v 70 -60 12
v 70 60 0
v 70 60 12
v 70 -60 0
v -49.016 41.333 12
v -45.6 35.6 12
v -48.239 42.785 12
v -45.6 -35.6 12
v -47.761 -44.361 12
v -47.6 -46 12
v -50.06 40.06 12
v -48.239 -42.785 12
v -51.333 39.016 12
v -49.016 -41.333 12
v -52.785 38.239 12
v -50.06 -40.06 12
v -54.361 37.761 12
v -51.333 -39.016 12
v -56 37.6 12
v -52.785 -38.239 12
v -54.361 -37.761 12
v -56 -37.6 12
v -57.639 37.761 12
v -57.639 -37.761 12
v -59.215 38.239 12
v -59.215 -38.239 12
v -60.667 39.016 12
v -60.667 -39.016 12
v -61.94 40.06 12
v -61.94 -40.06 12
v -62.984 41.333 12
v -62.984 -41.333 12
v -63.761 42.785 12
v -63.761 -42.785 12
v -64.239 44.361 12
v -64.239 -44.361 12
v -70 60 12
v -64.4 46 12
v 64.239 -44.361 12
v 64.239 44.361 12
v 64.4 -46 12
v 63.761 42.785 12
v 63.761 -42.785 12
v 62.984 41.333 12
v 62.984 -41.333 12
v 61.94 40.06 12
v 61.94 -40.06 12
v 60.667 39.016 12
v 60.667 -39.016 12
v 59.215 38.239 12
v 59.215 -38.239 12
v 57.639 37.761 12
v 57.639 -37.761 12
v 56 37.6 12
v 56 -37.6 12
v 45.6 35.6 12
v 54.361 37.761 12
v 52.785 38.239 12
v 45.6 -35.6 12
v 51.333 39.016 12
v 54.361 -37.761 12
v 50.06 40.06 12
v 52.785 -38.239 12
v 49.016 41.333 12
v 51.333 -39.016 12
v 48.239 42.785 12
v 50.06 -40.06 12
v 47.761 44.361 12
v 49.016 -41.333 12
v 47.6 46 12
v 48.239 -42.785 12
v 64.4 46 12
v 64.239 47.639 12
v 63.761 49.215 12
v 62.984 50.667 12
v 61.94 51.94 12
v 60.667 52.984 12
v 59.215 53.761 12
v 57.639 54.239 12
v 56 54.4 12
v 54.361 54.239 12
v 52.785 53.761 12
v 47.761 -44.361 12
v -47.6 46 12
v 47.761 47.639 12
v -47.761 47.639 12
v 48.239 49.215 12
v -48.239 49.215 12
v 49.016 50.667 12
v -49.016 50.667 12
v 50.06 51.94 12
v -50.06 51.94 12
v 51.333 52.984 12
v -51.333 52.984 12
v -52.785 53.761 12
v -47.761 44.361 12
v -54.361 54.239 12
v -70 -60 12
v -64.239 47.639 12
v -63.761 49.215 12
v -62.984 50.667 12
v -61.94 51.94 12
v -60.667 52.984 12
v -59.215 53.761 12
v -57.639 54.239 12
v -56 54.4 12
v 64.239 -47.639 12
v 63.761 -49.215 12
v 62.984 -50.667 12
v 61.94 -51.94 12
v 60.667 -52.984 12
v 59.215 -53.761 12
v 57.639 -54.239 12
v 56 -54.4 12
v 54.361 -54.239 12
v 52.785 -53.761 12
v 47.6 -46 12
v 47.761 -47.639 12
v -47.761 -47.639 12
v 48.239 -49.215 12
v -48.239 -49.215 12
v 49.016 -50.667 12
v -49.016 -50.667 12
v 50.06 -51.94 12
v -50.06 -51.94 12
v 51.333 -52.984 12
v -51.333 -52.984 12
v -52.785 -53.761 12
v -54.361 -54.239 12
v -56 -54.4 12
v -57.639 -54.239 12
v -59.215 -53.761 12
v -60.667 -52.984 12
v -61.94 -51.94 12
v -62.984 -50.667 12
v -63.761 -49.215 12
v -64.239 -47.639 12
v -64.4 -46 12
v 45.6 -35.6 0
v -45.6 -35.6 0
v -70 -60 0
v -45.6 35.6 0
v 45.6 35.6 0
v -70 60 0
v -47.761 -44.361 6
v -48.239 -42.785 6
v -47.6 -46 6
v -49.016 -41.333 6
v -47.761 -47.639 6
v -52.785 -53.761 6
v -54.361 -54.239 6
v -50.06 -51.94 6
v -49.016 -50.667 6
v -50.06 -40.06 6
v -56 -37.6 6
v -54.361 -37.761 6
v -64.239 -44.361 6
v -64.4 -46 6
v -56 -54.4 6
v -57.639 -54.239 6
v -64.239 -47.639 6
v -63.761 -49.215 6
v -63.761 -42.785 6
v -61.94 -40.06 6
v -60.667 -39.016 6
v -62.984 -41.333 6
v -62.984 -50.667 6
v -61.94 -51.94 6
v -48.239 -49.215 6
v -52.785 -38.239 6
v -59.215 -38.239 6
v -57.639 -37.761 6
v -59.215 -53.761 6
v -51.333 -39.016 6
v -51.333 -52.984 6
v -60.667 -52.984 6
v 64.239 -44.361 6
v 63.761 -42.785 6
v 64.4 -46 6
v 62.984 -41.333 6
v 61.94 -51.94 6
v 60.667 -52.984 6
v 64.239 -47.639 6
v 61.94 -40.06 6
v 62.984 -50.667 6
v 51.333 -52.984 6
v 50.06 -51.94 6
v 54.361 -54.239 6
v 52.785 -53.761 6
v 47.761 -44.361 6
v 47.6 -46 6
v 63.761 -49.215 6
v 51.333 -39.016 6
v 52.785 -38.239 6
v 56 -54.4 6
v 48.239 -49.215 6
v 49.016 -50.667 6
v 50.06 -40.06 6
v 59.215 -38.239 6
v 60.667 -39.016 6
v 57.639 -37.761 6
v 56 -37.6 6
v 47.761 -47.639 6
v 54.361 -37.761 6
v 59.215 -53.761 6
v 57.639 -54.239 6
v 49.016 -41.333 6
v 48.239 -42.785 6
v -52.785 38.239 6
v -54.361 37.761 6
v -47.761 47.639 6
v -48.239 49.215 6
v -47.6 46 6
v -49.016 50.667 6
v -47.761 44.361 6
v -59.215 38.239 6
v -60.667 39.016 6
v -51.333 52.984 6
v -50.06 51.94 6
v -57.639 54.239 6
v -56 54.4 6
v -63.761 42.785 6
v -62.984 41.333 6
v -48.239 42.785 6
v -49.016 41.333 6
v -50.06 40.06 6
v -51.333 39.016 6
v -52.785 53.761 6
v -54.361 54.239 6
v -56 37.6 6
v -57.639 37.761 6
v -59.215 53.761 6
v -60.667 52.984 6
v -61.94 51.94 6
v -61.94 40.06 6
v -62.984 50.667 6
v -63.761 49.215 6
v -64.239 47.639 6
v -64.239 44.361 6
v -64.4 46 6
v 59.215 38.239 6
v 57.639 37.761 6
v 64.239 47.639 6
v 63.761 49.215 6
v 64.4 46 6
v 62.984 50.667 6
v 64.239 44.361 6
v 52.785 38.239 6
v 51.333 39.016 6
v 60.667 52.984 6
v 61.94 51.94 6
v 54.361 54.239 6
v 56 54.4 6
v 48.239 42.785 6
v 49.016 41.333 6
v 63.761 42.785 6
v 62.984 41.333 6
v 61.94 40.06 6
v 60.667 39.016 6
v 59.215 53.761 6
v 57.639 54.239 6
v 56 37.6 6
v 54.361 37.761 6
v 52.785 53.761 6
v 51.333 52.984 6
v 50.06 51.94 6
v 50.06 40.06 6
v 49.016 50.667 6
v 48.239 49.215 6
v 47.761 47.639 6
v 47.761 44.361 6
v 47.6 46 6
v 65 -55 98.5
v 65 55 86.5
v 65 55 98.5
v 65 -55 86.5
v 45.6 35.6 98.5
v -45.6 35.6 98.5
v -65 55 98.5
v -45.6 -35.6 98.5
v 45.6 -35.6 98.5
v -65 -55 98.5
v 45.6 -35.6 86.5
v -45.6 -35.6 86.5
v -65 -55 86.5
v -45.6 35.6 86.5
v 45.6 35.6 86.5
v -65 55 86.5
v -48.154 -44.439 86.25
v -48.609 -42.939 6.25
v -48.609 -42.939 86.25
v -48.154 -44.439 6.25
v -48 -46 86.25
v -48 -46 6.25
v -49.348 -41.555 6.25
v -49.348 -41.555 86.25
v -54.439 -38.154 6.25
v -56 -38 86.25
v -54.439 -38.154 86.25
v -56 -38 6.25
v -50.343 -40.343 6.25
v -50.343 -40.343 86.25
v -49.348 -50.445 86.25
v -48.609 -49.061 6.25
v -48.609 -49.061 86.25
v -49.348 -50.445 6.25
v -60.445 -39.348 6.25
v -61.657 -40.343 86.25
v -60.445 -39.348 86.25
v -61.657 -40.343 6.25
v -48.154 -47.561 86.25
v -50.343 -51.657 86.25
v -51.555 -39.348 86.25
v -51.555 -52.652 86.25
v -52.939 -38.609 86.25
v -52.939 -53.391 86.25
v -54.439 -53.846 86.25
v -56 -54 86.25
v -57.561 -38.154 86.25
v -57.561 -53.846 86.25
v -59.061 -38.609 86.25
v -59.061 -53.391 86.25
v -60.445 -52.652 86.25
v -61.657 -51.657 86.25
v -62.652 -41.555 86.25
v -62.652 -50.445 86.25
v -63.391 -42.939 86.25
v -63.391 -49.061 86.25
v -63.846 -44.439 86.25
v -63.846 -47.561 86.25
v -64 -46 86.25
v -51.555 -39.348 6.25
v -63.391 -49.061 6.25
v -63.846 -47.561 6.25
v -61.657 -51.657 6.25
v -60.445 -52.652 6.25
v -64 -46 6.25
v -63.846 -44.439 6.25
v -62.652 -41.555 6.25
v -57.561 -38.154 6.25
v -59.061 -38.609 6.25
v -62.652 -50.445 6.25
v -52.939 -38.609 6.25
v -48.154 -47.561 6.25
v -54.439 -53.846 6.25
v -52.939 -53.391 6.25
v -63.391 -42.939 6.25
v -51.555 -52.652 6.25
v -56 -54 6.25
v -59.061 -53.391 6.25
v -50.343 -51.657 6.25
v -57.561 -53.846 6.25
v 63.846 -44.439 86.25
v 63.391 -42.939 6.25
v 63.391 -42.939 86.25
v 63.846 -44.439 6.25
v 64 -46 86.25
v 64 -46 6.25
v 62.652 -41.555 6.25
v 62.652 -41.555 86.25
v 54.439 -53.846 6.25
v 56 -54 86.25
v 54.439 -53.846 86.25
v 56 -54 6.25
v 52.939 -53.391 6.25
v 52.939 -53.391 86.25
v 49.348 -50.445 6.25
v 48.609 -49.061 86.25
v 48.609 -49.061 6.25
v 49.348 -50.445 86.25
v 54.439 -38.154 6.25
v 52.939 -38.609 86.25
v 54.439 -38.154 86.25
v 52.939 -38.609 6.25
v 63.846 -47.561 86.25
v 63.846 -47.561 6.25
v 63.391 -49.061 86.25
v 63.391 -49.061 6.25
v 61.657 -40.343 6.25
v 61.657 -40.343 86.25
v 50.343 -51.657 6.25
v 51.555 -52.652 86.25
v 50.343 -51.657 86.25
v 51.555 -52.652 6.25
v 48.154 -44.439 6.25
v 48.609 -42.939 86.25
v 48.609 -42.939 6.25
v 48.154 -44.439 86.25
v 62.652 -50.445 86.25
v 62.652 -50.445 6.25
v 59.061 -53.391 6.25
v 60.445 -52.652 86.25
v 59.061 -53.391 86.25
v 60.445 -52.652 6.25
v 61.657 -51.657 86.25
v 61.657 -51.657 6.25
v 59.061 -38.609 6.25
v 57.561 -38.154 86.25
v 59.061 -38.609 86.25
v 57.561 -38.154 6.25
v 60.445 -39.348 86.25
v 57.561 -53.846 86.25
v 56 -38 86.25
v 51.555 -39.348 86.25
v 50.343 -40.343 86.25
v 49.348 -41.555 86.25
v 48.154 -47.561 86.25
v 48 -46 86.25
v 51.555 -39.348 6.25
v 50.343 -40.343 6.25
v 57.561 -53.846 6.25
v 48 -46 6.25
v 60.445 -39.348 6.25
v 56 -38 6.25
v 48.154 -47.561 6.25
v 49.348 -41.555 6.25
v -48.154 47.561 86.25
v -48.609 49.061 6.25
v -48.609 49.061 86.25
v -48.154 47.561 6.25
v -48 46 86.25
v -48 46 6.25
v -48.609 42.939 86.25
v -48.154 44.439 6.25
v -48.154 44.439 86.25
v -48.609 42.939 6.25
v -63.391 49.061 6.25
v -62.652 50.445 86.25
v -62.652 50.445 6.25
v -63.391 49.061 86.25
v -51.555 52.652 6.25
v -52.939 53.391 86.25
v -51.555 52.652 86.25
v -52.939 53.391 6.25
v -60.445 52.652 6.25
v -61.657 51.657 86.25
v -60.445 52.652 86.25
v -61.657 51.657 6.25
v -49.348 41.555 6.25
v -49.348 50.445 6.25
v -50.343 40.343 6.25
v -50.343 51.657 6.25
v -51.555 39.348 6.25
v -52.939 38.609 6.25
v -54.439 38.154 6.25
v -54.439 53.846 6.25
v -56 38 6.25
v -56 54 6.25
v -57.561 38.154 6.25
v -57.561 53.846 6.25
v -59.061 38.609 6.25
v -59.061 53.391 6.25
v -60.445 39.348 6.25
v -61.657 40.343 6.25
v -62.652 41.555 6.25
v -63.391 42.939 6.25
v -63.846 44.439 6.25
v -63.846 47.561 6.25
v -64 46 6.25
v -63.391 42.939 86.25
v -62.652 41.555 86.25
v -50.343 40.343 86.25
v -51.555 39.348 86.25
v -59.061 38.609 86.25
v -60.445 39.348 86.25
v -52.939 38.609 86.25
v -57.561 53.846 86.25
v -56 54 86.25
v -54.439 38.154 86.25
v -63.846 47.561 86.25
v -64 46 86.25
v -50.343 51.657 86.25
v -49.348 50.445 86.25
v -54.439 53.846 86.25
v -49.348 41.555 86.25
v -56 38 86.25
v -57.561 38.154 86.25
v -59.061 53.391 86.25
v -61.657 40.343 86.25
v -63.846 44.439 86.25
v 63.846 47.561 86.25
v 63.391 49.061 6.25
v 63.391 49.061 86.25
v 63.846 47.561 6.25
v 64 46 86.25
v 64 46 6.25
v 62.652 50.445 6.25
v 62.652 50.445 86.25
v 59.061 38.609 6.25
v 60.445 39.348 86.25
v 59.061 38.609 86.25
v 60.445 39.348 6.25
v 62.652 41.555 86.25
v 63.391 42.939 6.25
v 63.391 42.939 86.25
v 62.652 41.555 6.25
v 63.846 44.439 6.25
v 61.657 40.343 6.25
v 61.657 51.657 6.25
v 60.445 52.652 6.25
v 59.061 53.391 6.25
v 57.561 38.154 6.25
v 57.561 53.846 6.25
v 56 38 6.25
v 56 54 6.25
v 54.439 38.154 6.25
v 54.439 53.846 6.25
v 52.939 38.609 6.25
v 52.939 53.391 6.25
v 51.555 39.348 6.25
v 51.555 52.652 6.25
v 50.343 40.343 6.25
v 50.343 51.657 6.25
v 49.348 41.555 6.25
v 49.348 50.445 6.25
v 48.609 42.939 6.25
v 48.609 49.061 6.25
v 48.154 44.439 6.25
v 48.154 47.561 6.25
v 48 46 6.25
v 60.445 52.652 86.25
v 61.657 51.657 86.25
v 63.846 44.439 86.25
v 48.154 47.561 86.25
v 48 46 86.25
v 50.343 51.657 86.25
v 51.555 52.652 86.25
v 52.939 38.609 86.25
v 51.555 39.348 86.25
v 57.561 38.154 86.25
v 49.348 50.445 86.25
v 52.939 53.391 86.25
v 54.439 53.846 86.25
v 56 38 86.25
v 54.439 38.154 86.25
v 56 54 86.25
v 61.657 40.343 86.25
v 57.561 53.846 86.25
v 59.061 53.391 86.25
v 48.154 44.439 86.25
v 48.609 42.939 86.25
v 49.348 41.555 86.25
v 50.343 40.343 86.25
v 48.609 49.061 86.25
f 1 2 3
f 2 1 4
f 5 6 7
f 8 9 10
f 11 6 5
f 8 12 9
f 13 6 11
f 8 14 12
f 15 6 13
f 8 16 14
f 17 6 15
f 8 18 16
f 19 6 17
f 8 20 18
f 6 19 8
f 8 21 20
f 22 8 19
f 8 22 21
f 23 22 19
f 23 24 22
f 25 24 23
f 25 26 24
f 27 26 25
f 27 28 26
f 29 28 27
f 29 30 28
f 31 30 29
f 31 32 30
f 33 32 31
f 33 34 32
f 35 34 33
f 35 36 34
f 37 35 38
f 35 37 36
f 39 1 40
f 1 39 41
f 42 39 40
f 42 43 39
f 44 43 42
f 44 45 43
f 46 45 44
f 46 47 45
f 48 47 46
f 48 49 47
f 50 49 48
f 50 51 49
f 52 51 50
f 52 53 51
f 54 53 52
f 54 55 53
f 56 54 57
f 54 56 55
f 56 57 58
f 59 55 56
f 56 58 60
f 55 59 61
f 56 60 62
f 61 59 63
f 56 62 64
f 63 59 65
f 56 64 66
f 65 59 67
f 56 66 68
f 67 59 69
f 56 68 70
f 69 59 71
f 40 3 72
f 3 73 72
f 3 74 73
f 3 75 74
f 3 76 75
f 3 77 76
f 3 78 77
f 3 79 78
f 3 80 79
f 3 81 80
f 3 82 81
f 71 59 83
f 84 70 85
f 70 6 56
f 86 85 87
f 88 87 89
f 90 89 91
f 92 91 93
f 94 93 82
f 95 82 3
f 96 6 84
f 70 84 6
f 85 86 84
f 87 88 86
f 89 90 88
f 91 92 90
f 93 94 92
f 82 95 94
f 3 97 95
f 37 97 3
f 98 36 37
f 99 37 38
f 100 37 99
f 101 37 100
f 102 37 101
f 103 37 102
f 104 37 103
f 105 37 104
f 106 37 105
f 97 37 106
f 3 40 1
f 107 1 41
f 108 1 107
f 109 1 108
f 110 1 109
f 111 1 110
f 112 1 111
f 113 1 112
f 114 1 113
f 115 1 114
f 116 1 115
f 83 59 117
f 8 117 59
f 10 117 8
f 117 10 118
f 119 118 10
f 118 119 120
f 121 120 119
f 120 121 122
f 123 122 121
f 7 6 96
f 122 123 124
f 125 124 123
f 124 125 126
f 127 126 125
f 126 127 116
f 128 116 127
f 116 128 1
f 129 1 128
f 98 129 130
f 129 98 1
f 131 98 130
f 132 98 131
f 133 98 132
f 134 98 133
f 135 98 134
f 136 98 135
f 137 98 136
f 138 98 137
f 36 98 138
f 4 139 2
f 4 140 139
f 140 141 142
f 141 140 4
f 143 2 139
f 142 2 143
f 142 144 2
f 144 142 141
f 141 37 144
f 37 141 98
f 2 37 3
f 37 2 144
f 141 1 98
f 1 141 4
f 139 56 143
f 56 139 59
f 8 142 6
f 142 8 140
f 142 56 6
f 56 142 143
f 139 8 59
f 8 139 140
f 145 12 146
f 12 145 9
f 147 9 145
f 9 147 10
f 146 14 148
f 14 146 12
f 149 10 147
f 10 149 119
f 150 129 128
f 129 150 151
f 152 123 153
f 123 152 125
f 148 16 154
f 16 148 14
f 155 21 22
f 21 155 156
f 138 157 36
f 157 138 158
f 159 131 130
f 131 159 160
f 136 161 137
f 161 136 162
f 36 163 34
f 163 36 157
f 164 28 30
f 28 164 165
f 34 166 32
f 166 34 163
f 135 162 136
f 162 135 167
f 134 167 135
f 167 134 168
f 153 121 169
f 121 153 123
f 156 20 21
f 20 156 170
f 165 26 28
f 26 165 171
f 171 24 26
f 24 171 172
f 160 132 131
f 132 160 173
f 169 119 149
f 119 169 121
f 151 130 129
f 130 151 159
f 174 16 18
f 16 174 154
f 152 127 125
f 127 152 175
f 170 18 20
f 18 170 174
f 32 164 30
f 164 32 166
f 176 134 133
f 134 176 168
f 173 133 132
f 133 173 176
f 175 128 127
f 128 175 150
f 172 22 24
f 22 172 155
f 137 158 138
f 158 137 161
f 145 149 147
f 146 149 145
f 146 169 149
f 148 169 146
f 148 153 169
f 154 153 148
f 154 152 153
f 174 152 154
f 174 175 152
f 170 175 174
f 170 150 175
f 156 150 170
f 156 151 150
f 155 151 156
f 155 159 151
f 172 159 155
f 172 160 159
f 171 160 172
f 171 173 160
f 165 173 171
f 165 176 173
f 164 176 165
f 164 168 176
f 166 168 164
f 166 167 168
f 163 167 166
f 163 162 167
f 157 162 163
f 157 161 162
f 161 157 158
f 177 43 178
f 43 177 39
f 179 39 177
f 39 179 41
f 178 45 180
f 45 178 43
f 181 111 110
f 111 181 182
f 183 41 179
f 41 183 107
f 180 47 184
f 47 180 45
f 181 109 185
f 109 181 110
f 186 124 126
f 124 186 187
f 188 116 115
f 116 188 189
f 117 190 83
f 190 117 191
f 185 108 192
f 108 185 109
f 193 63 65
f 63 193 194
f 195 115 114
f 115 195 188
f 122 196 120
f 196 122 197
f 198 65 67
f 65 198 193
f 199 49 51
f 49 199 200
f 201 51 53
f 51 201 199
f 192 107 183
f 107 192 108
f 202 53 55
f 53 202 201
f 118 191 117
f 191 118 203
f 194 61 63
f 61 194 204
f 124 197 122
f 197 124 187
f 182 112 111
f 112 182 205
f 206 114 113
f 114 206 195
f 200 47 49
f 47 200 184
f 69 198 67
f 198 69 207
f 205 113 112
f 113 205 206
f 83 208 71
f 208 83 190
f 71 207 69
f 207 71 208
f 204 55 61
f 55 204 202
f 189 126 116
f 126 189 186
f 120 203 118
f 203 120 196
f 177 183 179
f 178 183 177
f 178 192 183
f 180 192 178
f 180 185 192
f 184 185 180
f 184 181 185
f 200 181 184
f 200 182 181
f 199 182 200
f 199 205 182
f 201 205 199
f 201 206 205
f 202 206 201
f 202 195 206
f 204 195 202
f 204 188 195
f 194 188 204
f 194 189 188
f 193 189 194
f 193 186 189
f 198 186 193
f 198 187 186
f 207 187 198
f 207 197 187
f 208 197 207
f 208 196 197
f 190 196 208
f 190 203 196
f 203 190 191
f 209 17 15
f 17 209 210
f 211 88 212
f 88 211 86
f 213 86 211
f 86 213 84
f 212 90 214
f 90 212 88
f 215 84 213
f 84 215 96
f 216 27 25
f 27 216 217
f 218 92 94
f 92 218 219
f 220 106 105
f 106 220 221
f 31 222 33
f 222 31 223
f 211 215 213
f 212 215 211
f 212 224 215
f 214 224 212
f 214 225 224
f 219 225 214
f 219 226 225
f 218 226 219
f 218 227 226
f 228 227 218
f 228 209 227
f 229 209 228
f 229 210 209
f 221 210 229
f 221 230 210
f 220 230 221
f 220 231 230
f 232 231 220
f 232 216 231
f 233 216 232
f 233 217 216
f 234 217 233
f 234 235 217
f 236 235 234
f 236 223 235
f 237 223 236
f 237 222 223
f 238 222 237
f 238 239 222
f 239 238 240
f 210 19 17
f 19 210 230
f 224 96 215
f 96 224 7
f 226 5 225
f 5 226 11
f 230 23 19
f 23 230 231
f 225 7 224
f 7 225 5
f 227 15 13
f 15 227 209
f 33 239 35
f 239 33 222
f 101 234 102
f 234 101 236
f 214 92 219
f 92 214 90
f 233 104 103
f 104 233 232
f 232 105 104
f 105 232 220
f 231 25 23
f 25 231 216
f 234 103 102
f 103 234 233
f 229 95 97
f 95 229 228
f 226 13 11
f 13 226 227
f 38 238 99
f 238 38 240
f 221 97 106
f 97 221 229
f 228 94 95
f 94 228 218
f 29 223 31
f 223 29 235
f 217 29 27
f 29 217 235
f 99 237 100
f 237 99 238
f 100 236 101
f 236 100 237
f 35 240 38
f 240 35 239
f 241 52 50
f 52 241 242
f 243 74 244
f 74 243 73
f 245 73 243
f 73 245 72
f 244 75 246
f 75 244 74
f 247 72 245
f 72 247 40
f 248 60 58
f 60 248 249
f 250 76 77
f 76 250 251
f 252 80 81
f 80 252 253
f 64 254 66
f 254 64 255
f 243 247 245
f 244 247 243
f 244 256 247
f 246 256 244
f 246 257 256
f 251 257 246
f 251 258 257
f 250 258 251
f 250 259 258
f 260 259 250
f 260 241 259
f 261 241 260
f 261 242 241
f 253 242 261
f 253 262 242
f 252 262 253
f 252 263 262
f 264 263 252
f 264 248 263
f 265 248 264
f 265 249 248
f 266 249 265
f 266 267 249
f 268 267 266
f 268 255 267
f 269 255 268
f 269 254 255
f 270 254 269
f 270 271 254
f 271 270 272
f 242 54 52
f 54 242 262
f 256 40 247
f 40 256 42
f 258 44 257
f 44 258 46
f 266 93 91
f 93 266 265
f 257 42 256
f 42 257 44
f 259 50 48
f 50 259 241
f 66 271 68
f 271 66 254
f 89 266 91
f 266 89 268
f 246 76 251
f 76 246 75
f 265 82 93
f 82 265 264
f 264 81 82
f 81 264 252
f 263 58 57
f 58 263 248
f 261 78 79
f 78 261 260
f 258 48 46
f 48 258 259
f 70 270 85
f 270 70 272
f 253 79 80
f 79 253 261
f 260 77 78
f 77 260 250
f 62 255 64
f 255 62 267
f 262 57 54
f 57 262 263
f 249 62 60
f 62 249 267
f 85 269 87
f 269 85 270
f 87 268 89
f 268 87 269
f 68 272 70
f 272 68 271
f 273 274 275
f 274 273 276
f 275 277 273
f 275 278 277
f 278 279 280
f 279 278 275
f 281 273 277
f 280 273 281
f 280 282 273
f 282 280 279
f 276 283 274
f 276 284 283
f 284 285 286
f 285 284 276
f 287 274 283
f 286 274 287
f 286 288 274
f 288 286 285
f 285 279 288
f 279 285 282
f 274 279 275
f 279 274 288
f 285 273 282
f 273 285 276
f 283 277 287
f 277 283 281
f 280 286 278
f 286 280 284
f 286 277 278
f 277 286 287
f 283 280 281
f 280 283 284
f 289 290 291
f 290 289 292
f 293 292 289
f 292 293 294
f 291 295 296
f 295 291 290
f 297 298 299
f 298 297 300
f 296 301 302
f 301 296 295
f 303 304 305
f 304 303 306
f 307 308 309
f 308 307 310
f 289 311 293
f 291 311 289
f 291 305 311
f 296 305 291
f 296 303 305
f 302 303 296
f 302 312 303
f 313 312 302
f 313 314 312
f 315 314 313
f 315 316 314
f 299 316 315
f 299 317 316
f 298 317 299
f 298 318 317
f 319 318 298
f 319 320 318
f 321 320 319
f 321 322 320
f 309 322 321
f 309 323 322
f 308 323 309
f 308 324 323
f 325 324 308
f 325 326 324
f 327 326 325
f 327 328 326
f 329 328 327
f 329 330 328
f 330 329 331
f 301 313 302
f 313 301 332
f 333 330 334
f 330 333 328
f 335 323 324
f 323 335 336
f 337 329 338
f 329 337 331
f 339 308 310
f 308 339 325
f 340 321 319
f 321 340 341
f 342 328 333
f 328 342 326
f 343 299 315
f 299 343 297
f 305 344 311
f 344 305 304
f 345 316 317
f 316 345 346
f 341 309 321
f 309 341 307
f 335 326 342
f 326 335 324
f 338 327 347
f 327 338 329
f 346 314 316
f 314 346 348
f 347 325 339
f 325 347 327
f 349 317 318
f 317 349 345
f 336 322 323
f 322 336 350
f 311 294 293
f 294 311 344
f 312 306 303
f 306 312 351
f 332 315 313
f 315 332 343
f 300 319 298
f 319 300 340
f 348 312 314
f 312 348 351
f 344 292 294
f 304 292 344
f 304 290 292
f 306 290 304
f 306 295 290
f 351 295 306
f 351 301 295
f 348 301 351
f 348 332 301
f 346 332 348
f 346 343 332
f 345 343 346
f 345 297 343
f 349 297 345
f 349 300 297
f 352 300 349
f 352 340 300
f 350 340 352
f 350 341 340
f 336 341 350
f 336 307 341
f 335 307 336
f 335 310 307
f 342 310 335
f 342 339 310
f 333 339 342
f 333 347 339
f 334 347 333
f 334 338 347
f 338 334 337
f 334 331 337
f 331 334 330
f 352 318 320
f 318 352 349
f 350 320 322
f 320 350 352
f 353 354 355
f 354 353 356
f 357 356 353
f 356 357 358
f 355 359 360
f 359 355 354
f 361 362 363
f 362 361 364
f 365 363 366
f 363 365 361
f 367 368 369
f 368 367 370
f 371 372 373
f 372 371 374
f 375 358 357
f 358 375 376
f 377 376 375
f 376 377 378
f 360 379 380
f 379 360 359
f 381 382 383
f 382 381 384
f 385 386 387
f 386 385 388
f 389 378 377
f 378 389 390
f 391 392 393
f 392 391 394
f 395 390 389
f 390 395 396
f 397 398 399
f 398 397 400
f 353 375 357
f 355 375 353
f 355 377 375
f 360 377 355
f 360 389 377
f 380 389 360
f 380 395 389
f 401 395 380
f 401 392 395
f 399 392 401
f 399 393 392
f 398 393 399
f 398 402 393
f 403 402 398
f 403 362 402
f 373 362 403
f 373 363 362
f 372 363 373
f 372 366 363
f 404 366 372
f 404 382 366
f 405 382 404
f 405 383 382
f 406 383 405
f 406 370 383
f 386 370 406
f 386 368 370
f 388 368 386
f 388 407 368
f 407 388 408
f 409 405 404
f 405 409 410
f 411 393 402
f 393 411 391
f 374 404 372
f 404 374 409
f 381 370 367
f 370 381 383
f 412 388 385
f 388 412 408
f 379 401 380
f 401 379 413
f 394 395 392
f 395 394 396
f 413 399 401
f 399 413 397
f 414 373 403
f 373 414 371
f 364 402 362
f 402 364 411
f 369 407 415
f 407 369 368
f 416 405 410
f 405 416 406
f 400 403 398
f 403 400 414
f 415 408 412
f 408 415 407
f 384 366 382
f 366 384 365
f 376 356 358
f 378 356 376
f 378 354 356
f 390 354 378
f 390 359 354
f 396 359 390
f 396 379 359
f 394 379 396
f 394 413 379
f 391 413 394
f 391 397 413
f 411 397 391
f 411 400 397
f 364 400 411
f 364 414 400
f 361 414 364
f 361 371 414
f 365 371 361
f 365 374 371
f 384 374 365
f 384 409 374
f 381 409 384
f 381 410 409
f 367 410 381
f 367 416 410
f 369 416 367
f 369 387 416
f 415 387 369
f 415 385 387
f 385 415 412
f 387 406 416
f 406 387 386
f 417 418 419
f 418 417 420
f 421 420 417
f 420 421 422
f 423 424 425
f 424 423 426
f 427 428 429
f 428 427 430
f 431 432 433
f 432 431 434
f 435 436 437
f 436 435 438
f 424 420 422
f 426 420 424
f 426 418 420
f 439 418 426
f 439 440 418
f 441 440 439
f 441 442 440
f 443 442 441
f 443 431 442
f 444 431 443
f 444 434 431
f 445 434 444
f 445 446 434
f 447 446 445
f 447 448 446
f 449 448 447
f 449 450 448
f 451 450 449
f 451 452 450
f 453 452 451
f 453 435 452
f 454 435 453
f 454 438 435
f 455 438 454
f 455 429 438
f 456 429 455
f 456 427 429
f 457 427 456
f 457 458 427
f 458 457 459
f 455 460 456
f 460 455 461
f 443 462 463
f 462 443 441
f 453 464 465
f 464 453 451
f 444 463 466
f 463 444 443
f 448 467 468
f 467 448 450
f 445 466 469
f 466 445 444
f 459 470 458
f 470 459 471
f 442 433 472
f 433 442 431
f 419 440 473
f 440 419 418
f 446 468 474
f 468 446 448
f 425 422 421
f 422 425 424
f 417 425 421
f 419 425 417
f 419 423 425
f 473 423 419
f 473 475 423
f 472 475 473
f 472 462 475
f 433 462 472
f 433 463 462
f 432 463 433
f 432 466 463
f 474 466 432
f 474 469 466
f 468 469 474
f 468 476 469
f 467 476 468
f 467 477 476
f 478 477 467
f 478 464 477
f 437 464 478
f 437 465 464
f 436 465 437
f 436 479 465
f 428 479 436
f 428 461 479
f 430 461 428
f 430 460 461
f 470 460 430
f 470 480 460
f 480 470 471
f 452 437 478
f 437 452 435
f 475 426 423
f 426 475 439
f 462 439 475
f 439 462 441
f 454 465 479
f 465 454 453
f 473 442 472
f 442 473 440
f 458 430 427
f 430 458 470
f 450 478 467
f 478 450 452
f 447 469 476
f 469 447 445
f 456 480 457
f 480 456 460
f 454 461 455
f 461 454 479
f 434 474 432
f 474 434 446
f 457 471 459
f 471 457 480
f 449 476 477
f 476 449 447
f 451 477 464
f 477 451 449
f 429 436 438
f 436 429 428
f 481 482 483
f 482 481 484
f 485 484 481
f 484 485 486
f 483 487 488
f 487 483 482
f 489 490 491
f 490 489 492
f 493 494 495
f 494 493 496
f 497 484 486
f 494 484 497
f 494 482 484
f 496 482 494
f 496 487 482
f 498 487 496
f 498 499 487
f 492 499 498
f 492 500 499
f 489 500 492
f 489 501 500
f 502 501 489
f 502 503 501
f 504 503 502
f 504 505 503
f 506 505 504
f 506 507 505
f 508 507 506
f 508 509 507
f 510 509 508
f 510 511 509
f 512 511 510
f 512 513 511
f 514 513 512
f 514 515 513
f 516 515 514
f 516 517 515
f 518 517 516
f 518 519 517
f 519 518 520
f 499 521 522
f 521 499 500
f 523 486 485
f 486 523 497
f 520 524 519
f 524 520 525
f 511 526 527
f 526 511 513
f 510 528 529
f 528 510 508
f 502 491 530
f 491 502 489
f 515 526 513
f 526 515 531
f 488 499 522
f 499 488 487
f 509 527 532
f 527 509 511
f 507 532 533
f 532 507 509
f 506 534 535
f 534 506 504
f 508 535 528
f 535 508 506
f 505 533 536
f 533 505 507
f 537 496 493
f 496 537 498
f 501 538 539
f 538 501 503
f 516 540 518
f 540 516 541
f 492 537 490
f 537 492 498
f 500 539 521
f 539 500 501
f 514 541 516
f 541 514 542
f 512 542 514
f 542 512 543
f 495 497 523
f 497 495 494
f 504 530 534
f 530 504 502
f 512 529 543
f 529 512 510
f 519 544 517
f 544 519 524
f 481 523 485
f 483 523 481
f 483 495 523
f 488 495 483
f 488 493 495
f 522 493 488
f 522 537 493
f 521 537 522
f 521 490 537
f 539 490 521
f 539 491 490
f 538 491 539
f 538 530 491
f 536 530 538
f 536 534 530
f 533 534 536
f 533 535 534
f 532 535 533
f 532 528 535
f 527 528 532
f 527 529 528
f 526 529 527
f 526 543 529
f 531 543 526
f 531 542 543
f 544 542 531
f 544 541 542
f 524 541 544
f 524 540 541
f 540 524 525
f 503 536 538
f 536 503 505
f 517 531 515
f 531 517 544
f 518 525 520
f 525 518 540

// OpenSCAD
$fn = 32;

// ------------------------------------------------------------------------
// Frame cube: base 140 x 120 mm, posts 80 mm tall
// Every part is its own module, assembly() places every instance.
// ------------------------------------------------------------------------

// --- part 1 ---
module base_frame() {
  difference() {
    translate([-70, -60, 0]) cube([140, 120, 12]);
    translate([-45.6, -35.6, -1]) cube([91.2, 71.2, 14]);
    translate([-56, -46, 6]) cylinder(h = 7, d = 16.8);
    translate([56, -46, 6]) cylinder(h = 7, d = 16.8);
    translate([-56, 46, 6]) cylinder(h = 7, d = 16.8);
    translate([56, 46, 6]) cylinder(h = 7, d = 16.8);
  }
}

// --- part 2 ---
module corner_post() {
  cylinder(h = 80, d = 16);
}

// --- part 3 ---
module top_frame() {
  difference() {
    translate([-65, -55, 0]) cube([130, 110, 12]);
    translate([-45.6, -35.6, -1]) cube([91.2, 71.2, 14]);
  }
}

// --- assembly ---
module assembly() {
  color([0.80, 0.24, 0.20]) translate([0, 0, 0]) rotate([0, 0, 0]) base_frame();
  color([0.20, 0.45, 0.75]) translate([-56, -46, 6.25]) rotate([0, 0, 0]) corner_post();
  color([0.25, 0.62, 0.32]) translate([56, -46, 6.25]) rotate([0, 0, 0]) corner_post();
  color([0.92, 0.70, 0.18]) translate([-56, 46, 6.25]) rotate([0, 0, 0]) corner_post();
  color([0.58, 0.35, 0.70]) translate([56, 46, 6.25]) rotate([0, 0, 0]) corner_post();
  color([0.16, 0.66, 0.66]) translate([0, 0, 86.5]) rotate([0, 0, 0]) top_frame();
}

assembly();
